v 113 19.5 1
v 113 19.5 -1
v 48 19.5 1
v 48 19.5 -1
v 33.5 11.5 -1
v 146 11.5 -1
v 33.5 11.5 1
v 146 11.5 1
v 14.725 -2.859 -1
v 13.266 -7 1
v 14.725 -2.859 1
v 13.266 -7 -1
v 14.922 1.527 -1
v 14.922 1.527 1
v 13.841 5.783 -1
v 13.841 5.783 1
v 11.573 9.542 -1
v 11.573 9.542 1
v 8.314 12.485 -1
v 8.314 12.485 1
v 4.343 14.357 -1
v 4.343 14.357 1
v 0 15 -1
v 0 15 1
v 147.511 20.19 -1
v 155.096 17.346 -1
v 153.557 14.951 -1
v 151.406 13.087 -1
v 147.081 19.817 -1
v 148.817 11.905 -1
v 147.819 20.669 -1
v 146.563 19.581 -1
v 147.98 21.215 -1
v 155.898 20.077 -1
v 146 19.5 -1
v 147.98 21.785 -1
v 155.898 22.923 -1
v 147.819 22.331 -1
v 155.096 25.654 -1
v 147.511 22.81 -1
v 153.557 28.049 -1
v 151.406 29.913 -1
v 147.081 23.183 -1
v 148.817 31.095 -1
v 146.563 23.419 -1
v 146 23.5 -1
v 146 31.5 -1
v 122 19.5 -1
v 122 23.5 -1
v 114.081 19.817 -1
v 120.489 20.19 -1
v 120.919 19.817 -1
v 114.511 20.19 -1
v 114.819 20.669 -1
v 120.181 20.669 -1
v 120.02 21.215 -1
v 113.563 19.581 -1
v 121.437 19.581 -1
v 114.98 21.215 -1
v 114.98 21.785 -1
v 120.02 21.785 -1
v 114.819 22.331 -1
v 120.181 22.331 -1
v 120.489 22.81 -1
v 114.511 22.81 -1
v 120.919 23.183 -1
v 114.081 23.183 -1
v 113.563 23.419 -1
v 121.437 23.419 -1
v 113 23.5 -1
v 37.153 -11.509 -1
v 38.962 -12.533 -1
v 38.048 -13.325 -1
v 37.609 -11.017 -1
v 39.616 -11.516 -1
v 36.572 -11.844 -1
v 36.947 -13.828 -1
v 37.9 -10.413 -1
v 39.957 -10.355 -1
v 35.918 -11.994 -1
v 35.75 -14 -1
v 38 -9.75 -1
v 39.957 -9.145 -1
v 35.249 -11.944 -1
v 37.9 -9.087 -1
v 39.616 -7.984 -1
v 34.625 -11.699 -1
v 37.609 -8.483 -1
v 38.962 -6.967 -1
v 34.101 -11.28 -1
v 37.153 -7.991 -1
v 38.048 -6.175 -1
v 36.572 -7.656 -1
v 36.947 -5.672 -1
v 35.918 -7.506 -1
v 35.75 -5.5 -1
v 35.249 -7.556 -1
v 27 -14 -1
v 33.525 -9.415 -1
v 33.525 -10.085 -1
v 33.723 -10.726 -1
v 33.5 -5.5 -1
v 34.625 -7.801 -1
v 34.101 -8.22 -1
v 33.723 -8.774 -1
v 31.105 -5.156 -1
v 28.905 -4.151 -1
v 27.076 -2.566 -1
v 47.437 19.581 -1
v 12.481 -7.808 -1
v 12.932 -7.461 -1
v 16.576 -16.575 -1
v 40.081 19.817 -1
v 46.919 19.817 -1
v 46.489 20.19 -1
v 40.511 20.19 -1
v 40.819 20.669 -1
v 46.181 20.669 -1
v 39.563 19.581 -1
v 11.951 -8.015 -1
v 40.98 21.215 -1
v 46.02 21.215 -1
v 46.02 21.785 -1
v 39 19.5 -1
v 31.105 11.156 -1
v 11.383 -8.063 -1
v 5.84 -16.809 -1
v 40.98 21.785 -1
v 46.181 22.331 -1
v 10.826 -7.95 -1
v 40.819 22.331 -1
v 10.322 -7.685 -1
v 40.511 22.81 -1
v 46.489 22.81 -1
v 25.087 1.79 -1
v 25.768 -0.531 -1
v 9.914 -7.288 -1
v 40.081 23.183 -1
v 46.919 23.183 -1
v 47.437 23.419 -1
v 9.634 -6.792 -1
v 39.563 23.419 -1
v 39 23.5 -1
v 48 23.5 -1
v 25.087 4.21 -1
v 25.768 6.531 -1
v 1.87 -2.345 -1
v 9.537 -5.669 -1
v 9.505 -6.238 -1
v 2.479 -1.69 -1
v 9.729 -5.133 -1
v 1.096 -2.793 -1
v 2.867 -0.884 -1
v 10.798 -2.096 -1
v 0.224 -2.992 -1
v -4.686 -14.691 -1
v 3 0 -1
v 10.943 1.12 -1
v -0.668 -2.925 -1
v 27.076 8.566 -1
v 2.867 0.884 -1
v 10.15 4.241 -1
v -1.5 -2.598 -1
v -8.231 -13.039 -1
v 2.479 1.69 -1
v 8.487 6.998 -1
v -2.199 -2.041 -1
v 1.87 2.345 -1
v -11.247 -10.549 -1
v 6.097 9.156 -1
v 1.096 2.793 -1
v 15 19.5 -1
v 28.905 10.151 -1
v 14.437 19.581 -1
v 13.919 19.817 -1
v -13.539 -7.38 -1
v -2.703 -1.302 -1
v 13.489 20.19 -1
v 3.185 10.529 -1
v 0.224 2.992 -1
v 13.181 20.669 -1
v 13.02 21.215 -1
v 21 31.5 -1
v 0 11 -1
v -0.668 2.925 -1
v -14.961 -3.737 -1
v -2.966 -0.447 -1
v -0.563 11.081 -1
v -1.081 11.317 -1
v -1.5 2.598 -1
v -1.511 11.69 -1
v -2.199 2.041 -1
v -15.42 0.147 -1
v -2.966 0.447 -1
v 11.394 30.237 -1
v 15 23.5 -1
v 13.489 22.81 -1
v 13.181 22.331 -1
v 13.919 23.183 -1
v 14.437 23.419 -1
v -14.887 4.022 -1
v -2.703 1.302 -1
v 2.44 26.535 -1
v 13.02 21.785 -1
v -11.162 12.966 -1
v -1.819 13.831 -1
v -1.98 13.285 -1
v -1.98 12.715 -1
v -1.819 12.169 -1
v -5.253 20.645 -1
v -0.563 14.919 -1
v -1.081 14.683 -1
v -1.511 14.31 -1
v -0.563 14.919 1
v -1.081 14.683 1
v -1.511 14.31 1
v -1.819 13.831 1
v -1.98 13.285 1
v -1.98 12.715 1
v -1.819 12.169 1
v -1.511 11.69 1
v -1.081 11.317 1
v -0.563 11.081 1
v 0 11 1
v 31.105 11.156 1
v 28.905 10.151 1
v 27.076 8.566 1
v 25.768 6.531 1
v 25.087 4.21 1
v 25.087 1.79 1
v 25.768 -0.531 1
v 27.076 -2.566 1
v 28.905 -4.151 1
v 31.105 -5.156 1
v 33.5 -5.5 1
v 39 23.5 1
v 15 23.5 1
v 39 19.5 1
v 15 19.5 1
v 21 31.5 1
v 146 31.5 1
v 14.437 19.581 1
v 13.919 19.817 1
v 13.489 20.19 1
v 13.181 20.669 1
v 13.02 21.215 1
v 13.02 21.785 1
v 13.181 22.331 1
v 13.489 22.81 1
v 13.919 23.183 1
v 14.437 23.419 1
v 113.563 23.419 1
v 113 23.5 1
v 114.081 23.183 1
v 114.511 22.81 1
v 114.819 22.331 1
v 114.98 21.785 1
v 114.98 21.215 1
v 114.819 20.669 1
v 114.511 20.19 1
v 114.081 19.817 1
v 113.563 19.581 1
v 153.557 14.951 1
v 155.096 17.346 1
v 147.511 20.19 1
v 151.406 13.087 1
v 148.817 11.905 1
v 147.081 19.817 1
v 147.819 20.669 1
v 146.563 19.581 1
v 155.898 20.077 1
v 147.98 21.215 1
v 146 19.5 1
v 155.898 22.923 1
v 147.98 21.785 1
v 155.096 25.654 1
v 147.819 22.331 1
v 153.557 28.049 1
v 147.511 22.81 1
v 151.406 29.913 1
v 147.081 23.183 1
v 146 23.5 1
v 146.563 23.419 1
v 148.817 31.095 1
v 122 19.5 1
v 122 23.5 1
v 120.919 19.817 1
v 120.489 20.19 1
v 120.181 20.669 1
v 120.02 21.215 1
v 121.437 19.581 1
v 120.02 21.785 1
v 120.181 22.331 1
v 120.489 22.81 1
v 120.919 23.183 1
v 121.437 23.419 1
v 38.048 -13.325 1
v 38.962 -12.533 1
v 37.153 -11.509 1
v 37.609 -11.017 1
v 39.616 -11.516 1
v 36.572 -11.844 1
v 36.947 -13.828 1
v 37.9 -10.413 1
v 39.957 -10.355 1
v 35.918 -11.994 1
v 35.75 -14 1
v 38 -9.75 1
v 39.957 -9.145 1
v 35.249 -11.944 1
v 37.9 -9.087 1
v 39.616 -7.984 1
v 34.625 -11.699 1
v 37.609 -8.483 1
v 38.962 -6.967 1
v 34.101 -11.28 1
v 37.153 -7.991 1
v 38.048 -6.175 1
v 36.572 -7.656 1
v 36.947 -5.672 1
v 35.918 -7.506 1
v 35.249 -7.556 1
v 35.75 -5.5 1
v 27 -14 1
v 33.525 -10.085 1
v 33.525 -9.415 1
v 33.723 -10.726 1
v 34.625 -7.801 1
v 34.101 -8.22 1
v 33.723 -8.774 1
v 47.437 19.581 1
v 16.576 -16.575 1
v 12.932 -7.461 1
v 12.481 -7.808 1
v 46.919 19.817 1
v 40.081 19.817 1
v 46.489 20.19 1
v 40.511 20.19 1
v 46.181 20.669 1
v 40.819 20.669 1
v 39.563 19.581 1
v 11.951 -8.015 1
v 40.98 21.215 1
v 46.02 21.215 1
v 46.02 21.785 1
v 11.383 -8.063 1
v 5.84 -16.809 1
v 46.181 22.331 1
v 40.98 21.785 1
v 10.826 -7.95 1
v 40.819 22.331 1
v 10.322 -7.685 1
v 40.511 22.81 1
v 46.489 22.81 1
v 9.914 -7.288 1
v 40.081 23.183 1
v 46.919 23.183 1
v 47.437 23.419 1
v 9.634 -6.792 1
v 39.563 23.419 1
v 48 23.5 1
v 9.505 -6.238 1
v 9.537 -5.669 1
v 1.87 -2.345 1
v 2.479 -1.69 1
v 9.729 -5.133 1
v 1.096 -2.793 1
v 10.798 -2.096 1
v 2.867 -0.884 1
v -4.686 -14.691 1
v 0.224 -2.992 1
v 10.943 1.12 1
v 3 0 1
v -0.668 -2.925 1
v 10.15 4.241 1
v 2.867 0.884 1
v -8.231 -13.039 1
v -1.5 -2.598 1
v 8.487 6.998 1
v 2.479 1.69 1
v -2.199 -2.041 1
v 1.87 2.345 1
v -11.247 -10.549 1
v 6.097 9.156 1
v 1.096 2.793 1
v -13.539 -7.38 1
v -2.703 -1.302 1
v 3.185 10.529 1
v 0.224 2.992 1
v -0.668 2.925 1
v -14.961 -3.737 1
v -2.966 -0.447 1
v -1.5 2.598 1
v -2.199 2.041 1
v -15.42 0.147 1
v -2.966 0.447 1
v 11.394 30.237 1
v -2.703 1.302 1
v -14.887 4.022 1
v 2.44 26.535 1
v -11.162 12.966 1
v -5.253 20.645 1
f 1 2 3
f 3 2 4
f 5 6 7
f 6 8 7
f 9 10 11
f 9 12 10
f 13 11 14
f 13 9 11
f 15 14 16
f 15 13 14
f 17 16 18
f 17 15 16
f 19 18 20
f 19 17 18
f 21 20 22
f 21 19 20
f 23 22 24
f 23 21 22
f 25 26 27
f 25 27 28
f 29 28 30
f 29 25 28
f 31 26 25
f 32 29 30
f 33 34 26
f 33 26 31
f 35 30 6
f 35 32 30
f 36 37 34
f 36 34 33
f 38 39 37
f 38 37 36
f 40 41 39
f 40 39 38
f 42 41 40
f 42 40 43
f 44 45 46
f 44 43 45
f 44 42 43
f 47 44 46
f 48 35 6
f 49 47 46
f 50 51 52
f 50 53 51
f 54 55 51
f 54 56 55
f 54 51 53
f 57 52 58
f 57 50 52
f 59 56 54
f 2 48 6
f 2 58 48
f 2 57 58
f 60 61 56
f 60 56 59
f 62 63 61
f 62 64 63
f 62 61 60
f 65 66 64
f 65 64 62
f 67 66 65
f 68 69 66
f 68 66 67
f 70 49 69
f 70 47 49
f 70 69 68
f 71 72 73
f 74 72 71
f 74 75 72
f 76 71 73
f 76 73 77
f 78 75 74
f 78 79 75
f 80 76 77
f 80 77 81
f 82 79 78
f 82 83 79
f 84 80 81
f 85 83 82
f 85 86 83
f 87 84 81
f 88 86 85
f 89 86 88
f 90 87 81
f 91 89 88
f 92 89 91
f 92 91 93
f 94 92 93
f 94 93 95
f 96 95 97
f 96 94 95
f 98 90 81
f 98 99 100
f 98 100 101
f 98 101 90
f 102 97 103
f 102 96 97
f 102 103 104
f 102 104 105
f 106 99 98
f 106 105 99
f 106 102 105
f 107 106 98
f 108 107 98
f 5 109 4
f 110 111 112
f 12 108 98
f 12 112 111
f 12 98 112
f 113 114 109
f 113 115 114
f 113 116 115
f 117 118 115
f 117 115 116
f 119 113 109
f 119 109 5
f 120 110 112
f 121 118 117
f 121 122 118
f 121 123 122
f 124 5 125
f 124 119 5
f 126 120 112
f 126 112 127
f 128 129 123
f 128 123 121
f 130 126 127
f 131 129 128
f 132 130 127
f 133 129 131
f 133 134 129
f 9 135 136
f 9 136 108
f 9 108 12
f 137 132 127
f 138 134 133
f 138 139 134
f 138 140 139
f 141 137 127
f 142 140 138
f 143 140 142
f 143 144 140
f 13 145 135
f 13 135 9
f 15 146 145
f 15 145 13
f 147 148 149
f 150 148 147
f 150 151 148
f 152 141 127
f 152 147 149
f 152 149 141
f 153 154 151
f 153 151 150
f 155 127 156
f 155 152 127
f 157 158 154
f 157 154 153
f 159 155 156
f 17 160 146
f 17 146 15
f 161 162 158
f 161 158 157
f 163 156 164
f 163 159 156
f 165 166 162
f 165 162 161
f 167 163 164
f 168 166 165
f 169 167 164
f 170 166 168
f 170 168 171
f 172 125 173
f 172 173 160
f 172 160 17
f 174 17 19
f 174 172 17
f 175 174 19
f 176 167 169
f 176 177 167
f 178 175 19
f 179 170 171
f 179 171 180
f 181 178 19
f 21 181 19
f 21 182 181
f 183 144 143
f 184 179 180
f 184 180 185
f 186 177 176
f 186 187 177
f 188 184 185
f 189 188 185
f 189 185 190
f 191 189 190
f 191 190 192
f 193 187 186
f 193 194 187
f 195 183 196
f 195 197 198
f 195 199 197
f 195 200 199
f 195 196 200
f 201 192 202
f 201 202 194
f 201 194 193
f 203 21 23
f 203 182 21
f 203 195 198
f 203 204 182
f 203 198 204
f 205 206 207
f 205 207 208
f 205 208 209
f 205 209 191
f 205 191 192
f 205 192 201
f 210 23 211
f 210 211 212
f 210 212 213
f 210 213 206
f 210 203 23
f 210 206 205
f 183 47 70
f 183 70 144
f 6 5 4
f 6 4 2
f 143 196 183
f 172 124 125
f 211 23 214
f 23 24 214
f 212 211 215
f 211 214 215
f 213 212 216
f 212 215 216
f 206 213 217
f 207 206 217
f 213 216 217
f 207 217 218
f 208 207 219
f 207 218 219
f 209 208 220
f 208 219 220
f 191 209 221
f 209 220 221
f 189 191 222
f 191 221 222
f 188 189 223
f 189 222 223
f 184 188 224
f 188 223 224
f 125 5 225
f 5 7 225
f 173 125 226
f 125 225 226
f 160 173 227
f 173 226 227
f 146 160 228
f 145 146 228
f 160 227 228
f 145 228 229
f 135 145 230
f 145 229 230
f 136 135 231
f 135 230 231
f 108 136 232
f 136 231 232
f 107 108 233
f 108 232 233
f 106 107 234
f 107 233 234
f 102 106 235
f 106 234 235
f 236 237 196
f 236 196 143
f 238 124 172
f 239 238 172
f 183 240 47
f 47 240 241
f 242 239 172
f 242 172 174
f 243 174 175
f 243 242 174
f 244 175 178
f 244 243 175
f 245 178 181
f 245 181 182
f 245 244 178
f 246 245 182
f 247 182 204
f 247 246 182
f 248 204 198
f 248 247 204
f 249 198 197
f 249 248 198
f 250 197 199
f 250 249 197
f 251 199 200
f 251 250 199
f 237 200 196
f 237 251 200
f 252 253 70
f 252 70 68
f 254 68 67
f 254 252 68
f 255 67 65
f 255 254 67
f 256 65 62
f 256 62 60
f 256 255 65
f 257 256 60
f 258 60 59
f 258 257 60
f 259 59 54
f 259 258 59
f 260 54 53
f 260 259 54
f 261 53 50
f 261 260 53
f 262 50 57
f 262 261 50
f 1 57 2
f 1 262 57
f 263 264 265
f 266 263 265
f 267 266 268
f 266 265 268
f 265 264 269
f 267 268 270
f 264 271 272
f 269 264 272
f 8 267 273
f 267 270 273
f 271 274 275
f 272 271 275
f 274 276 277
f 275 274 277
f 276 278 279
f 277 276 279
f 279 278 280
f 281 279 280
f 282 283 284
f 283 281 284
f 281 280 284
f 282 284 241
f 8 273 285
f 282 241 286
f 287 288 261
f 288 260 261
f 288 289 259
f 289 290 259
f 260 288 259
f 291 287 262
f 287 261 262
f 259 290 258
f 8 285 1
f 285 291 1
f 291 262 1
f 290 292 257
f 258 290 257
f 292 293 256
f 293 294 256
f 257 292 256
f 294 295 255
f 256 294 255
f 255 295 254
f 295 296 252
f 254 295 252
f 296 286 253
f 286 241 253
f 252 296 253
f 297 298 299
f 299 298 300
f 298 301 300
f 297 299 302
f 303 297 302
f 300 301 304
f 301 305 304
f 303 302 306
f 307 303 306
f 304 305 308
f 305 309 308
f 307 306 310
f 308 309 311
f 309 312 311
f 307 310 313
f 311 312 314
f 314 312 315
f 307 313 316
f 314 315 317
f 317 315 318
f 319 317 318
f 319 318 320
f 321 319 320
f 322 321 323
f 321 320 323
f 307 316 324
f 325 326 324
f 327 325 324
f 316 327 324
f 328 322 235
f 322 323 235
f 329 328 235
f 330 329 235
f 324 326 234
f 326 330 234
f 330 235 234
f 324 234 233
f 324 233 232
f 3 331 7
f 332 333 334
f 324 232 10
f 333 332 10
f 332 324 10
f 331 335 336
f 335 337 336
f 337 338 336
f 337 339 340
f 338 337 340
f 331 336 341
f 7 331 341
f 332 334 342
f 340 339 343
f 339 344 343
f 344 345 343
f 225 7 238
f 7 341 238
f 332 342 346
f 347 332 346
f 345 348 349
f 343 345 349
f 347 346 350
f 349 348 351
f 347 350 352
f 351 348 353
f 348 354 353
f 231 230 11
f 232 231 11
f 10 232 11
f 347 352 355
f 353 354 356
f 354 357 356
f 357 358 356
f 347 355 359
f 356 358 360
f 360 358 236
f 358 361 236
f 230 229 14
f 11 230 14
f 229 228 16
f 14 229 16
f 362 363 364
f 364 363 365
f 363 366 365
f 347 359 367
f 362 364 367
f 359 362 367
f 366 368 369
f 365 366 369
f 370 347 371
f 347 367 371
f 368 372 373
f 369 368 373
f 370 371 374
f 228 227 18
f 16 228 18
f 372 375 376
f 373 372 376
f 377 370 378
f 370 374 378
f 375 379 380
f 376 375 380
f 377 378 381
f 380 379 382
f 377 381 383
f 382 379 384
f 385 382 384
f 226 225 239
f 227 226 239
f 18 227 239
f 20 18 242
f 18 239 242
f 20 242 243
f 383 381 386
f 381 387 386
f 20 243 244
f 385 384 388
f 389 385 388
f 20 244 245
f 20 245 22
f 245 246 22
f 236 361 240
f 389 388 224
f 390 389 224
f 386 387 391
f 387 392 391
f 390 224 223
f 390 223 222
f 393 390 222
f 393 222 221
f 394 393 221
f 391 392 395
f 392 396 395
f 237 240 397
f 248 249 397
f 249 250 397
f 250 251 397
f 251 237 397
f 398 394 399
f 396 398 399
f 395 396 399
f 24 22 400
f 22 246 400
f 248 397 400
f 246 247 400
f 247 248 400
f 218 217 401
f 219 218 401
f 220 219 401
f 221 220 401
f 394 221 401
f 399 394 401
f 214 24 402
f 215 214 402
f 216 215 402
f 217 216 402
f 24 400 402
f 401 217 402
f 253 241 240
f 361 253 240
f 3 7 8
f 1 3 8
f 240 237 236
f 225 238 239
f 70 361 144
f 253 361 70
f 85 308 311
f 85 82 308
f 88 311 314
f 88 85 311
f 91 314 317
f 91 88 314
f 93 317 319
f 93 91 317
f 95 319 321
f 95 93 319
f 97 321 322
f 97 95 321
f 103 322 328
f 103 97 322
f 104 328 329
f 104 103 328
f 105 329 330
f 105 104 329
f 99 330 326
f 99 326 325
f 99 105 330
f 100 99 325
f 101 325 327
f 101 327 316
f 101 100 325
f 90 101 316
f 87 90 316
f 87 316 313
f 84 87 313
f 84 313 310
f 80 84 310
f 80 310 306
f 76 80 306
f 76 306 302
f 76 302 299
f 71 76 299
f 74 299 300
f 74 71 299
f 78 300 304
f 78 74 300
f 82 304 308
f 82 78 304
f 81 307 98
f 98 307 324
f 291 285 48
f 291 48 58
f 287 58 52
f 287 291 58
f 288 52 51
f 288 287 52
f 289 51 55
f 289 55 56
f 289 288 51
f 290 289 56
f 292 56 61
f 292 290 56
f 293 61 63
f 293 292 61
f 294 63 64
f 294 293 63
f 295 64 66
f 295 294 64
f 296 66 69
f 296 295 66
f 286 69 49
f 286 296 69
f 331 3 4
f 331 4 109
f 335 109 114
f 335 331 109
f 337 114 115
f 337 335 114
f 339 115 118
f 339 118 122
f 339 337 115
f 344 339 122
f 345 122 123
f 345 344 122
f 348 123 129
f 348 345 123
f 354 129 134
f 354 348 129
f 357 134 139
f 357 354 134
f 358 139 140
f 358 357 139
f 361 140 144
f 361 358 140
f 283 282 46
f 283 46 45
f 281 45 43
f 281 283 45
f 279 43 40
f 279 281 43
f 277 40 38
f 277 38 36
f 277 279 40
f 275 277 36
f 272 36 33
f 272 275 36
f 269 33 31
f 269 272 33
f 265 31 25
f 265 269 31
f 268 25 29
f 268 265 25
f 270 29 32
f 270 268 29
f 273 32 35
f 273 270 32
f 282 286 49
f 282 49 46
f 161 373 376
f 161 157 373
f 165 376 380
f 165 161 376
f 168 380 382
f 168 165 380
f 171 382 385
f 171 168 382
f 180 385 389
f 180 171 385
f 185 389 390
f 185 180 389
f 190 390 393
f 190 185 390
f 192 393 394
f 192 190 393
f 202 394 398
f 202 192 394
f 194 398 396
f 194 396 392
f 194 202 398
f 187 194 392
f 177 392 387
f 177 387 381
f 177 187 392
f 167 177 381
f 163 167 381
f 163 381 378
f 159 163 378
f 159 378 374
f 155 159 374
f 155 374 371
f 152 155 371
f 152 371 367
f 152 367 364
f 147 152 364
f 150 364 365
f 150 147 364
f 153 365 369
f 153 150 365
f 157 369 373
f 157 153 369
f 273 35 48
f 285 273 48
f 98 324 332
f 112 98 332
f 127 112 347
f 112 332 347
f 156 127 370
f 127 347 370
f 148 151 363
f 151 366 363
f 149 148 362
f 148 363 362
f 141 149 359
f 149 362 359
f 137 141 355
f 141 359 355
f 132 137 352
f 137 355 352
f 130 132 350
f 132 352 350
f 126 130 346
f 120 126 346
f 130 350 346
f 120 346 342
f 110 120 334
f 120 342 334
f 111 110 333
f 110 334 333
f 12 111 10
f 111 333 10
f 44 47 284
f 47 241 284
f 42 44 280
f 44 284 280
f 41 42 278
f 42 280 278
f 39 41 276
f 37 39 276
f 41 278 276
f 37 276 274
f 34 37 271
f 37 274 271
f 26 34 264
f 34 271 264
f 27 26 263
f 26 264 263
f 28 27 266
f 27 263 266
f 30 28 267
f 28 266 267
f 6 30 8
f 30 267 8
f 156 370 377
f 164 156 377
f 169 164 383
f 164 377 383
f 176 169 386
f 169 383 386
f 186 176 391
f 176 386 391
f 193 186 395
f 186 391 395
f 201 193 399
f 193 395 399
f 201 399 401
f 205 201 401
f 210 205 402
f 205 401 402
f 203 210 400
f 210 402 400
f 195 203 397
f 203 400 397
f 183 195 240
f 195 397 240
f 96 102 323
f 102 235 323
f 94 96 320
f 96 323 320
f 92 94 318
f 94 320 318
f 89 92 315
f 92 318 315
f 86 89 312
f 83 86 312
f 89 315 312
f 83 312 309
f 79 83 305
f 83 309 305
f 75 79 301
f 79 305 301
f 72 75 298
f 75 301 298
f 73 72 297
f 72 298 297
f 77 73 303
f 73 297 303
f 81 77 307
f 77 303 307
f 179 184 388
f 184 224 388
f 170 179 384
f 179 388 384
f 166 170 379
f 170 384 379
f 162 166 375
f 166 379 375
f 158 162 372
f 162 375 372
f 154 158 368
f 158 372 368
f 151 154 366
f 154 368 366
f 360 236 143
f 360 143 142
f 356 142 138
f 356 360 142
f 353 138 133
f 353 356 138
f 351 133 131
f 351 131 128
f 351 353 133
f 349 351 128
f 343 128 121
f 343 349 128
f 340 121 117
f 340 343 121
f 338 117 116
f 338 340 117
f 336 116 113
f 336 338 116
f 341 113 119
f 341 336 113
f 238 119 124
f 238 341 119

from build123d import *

# Parameters (mm, degrees)
ESQUISSE1_R        = 2.25
ESQUISSE1_R_2      = 3
BOSS_EXTRU_1_DEPTH = 1


with BuildPart() as part:
    # Esquisse1 → Boss.-Extru.1 (new, symmetric)
    with BuildSketch(Plane.XY):
        with BuildLine():
            Line((21, 31.5), (146, 31.5))
            ThreePointArc((146, 31.5), (156, 21.5), (146, 11.5))
            Line((146, 11.5), (33.5, 11.5))
            ThreePointArc((33.5, 11.5), (25, 3), (33.5, -5.5))
            Line((33.5, -5.5), (35.75, -5.5))
            ThreePointArc((35.75, -5.5), (40, -9.75), (35.75, -14))
            Line((35.75, -14), (27, -14))
            ThreePointArc((27, -14), (11.214469473, -16.988397735), (-4.686322253, -14.690938802))
            ThreePointArc((-4.686322253, -14.690938802), (-13.539380352, -7.380411831), (-14.886645987, 4.02157561))
            ThreePointArc((-14.886645987, 4.02157561), (-1.599309542, 23.841476371), (21, 31.5))
        make_face()
        with Locations((35.75, -9.75)):
            Circle(ESQUISSE1_R, mode=Mode.SUBTRACT)
        Circle(ESQUISSE1_R_2, mode=Mode.SUBTRACT)
        with BuildLine():
            Line((15, 23.5), (39, 23.5))
            ThreePointArc((39, 23.5), (41, 21.5), (39, 19.5))
            Line((39, 19.5), (15, 19.5))
            ThreePointArc((15, 19.5), (13, 21.5), (15, 23.5))
        make_face(mode=Mode.SUBTRACT)
        with BuildLine():
            Line((48, 23.5), (113, 23.5))
            ThreePointArc((113, 23.5), (115, 21.5), (113, 19.5))
            Line((113, 19.5), (48, 19.5))
            ThreePointArc((48, 19.5), (46, 21.5), (48, 23.5))
        make_face(mode=Mode.SUBTRACT)
        with BuildLine():
            Line((122, 23.5), (146, 23.5))
            ThreePointArc((146, 23.5), (148, 21.5), (146, 19.5))
            Line((146, 19.5), (122, 19.5))
            ThreePointArc((122, 19.5), (120, 21.5), (122, 23.5))
        make_face(mode=Mode.SUBTRACT)
        with BuildLine():
            ThreePointArc((13.266499161, -7), (12.845232579, 7.745966692), (0, 15))
            ThreePointArc((0, 15), (-2, 13), (0, 11))
            ThreePointArc((0, 11), (9.419837224, 5.680375574), (9.728766052, -5.133333333))
            ThreePointArc((9.728766052, -5.133333333), (10.564299273, -7.835533222), (13.266499161, -7))
        make_face(mode=Mode.SUBTRACT)
    extrude(amount=BOSS_EXTRU_1_DEPTH, both=True)


solid = part.part
